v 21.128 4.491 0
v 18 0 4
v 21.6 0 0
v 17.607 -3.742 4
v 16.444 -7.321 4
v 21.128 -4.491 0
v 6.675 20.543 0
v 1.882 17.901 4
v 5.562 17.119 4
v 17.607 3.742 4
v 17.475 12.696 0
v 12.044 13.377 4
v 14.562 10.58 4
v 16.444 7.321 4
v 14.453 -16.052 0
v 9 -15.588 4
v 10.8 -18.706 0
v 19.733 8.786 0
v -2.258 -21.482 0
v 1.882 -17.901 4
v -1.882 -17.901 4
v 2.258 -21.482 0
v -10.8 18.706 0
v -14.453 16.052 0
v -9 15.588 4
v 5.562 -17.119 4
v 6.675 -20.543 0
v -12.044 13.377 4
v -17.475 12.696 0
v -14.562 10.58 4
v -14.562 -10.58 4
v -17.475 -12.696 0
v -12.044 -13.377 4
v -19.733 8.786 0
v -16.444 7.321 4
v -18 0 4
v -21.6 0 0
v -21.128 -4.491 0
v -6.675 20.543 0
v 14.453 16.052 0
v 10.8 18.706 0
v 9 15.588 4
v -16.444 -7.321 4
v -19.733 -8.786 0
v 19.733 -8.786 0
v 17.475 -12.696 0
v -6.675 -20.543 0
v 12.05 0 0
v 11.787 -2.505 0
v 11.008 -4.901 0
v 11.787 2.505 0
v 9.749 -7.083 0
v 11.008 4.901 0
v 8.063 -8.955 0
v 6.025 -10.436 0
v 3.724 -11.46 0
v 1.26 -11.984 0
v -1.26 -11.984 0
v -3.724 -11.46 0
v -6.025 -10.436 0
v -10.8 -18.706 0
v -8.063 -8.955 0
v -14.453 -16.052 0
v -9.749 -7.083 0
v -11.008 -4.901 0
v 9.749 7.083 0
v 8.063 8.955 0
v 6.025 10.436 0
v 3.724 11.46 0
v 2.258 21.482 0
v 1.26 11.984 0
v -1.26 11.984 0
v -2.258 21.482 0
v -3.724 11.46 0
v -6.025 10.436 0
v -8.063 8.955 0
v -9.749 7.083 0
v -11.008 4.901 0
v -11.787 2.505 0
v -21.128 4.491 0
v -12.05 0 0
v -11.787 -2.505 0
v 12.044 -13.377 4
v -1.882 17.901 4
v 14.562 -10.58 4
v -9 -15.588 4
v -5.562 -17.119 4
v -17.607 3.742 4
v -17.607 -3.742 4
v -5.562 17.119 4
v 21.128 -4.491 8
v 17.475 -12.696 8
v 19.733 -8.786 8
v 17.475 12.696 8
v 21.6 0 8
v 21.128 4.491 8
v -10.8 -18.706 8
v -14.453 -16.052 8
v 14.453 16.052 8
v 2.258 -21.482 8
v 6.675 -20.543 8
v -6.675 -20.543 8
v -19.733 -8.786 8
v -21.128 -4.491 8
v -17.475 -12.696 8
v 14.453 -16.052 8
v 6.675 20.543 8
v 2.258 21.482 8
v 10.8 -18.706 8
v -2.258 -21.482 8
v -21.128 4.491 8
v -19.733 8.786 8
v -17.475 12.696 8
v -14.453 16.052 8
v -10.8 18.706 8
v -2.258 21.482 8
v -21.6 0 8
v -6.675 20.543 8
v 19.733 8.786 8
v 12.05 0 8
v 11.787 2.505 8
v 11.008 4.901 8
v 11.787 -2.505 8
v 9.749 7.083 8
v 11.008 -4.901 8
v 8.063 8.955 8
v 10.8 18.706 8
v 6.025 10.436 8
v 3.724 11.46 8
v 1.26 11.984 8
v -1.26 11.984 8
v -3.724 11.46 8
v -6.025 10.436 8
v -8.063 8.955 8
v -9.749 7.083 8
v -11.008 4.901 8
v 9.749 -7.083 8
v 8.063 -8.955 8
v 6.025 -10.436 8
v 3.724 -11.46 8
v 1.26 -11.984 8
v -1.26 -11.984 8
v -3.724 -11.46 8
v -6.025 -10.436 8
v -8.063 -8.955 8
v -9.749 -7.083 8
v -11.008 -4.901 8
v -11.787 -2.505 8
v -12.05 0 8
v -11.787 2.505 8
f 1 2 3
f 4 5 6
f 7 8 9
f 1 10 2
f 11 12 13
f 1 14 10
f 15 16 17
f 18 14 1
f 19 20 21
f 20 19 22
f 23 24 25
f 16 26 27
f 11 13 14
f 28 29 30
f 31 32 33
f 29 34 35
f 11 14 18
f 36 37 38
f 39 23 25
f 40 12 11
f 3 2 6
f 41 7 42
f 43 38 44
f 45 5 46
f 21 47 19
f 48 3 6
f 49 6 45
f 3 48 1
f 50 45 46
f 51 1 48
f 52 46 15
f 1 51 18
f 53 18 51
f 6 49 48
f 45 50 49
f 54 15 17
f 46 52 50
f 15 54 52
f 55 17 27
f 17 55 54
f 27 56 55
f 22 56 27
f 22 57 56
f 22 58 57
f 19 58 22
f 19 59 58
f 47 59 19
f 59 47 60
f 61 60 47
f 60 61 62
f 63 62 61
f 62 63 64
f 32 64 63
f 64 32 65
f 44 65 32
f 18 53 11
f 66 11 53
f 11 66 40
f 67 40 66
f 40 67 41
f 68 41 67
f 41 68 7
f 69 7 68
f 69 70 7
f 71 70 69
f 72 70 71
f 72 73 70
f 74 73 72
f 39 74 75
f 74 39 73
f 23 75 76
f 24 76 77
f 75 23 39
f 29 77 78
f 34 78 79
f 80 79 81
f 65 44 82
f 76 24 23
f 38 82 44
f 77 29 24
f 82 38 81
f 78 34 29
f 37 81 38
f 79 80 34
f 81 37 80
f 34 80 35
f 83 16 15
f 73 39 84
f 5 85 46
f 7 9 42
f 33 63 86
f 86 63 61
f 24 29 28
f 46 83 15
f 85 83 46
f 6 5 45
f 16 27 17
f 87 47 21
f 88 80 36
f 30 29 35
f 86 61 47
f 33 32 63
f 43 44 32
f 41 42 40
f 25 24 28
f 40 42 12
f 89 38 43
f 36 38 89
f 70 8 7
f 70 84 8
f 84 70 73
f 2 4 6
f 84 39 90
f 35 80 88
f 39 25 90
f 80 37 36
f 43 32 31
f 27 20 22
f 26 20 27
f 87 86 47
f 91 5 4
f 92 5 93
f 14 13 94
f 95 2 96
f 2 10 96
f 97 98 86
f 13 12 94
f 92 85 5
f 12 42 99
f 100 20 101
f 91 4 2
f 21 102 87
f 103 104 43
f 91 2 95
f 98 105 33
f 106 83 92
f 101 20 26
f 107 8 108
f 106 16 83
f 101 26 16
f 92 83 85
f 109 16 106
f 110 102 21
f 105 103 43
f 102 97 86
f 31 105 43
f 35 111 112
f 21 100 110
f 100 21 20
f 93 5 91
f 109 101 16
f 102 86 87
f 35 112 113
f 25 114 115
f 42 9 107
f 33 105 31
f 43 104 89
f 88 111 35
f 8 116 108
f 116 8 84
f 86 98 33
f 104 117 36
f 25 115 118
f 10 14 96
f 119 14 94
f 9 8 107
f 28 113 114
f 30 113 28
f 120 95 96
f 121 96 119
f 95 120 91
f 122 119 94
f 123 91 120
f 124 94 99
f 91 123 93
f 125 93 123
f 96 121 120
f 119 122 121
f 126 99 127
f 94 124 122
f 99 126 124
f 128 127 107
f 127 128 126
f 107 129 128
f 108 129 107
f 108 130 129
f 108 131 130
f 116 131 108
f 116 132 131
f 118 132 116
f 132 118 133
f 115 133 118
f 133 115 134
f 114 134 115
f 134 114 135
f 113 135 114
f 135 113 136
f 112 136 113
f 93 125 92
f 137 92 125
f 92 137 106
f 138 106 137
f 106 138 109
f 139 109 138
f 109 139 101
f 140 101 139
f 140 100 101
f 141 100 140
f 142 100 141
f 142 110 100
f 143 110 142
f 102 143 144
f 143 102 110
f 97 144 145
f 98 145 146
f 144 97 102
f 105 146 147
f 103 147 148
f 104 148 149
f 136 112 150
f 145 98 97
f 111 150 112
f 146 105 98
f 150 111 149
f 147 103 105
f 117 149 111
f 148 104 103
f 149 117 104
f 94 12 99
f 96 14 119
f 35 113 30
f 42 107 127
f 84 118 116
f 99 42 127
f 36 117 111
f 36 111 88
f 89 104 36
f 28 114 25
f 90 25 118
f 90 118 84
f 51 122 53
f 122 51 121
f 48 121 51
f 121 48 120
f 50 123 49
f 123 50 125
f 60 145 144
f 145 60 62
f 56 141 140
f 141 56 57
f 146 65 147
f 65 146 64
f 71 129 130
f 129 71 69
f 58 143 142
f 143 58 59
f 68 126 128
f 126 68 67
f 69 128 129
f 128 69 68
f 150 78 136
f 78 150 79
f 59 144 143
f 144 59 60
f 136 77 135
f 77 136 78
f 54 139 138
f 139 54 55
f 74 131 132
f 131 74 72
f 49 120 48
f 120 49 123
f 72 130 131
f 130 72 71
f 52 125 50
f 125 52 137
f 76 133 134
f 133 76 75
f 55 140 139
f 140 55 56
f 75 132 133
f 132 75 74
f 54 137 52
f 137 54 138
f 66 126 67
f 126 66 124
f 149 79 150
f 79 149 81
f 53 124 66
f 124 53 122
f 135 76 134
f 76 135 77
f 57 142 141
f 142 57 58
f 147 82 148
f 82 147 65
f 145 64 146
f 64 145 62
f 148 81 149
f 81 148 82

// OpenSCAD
// v groove bearing cover
// rrhb creative commons 6/18/2013

// flare > 1 exaggerates angle
// bearingd = bearing diameter
// hole = bearing outer diameter
// thickness = bearing thickness
// tolerance = how much slop to allow for pressfit bearing
// hole defaults to bearing size or can be the size of the diam of hole

module vwheel(bearingd=13,thickness=5,flare=1.2,tolerance=0.05,hole=0) {
  base = bearingd/4;  // thinnest portion of vgroove to bearing
  outer = (bearingd/2+base)*flare;
  inner = bearingd/2+base;
  hole = (hole==0 ? bearingd : hole);

  difference() {
    union() {
      cylinder(r1=outer,r2=inner,h=thickness/2);
      translate([0,0,thickness/2]) cylinder(r2=outer,r1=inner,h=thickness/2);
    }
    cylinder(r=hole/2+tolerance,h=thickness*2);
  }
}

// vwheel(bearingd=10,thickness=4,hole=5) ;   // 623-sized hole
//vwheel(bearingd=10,thickness=4) ;   // 623
//vwheel(bearingd=13,thickness=5) ; // 624
//vwheel(bearingd=16,thickness=5) ; // 625
vwheel(bearingd=24,thickness=8) ; // 628
